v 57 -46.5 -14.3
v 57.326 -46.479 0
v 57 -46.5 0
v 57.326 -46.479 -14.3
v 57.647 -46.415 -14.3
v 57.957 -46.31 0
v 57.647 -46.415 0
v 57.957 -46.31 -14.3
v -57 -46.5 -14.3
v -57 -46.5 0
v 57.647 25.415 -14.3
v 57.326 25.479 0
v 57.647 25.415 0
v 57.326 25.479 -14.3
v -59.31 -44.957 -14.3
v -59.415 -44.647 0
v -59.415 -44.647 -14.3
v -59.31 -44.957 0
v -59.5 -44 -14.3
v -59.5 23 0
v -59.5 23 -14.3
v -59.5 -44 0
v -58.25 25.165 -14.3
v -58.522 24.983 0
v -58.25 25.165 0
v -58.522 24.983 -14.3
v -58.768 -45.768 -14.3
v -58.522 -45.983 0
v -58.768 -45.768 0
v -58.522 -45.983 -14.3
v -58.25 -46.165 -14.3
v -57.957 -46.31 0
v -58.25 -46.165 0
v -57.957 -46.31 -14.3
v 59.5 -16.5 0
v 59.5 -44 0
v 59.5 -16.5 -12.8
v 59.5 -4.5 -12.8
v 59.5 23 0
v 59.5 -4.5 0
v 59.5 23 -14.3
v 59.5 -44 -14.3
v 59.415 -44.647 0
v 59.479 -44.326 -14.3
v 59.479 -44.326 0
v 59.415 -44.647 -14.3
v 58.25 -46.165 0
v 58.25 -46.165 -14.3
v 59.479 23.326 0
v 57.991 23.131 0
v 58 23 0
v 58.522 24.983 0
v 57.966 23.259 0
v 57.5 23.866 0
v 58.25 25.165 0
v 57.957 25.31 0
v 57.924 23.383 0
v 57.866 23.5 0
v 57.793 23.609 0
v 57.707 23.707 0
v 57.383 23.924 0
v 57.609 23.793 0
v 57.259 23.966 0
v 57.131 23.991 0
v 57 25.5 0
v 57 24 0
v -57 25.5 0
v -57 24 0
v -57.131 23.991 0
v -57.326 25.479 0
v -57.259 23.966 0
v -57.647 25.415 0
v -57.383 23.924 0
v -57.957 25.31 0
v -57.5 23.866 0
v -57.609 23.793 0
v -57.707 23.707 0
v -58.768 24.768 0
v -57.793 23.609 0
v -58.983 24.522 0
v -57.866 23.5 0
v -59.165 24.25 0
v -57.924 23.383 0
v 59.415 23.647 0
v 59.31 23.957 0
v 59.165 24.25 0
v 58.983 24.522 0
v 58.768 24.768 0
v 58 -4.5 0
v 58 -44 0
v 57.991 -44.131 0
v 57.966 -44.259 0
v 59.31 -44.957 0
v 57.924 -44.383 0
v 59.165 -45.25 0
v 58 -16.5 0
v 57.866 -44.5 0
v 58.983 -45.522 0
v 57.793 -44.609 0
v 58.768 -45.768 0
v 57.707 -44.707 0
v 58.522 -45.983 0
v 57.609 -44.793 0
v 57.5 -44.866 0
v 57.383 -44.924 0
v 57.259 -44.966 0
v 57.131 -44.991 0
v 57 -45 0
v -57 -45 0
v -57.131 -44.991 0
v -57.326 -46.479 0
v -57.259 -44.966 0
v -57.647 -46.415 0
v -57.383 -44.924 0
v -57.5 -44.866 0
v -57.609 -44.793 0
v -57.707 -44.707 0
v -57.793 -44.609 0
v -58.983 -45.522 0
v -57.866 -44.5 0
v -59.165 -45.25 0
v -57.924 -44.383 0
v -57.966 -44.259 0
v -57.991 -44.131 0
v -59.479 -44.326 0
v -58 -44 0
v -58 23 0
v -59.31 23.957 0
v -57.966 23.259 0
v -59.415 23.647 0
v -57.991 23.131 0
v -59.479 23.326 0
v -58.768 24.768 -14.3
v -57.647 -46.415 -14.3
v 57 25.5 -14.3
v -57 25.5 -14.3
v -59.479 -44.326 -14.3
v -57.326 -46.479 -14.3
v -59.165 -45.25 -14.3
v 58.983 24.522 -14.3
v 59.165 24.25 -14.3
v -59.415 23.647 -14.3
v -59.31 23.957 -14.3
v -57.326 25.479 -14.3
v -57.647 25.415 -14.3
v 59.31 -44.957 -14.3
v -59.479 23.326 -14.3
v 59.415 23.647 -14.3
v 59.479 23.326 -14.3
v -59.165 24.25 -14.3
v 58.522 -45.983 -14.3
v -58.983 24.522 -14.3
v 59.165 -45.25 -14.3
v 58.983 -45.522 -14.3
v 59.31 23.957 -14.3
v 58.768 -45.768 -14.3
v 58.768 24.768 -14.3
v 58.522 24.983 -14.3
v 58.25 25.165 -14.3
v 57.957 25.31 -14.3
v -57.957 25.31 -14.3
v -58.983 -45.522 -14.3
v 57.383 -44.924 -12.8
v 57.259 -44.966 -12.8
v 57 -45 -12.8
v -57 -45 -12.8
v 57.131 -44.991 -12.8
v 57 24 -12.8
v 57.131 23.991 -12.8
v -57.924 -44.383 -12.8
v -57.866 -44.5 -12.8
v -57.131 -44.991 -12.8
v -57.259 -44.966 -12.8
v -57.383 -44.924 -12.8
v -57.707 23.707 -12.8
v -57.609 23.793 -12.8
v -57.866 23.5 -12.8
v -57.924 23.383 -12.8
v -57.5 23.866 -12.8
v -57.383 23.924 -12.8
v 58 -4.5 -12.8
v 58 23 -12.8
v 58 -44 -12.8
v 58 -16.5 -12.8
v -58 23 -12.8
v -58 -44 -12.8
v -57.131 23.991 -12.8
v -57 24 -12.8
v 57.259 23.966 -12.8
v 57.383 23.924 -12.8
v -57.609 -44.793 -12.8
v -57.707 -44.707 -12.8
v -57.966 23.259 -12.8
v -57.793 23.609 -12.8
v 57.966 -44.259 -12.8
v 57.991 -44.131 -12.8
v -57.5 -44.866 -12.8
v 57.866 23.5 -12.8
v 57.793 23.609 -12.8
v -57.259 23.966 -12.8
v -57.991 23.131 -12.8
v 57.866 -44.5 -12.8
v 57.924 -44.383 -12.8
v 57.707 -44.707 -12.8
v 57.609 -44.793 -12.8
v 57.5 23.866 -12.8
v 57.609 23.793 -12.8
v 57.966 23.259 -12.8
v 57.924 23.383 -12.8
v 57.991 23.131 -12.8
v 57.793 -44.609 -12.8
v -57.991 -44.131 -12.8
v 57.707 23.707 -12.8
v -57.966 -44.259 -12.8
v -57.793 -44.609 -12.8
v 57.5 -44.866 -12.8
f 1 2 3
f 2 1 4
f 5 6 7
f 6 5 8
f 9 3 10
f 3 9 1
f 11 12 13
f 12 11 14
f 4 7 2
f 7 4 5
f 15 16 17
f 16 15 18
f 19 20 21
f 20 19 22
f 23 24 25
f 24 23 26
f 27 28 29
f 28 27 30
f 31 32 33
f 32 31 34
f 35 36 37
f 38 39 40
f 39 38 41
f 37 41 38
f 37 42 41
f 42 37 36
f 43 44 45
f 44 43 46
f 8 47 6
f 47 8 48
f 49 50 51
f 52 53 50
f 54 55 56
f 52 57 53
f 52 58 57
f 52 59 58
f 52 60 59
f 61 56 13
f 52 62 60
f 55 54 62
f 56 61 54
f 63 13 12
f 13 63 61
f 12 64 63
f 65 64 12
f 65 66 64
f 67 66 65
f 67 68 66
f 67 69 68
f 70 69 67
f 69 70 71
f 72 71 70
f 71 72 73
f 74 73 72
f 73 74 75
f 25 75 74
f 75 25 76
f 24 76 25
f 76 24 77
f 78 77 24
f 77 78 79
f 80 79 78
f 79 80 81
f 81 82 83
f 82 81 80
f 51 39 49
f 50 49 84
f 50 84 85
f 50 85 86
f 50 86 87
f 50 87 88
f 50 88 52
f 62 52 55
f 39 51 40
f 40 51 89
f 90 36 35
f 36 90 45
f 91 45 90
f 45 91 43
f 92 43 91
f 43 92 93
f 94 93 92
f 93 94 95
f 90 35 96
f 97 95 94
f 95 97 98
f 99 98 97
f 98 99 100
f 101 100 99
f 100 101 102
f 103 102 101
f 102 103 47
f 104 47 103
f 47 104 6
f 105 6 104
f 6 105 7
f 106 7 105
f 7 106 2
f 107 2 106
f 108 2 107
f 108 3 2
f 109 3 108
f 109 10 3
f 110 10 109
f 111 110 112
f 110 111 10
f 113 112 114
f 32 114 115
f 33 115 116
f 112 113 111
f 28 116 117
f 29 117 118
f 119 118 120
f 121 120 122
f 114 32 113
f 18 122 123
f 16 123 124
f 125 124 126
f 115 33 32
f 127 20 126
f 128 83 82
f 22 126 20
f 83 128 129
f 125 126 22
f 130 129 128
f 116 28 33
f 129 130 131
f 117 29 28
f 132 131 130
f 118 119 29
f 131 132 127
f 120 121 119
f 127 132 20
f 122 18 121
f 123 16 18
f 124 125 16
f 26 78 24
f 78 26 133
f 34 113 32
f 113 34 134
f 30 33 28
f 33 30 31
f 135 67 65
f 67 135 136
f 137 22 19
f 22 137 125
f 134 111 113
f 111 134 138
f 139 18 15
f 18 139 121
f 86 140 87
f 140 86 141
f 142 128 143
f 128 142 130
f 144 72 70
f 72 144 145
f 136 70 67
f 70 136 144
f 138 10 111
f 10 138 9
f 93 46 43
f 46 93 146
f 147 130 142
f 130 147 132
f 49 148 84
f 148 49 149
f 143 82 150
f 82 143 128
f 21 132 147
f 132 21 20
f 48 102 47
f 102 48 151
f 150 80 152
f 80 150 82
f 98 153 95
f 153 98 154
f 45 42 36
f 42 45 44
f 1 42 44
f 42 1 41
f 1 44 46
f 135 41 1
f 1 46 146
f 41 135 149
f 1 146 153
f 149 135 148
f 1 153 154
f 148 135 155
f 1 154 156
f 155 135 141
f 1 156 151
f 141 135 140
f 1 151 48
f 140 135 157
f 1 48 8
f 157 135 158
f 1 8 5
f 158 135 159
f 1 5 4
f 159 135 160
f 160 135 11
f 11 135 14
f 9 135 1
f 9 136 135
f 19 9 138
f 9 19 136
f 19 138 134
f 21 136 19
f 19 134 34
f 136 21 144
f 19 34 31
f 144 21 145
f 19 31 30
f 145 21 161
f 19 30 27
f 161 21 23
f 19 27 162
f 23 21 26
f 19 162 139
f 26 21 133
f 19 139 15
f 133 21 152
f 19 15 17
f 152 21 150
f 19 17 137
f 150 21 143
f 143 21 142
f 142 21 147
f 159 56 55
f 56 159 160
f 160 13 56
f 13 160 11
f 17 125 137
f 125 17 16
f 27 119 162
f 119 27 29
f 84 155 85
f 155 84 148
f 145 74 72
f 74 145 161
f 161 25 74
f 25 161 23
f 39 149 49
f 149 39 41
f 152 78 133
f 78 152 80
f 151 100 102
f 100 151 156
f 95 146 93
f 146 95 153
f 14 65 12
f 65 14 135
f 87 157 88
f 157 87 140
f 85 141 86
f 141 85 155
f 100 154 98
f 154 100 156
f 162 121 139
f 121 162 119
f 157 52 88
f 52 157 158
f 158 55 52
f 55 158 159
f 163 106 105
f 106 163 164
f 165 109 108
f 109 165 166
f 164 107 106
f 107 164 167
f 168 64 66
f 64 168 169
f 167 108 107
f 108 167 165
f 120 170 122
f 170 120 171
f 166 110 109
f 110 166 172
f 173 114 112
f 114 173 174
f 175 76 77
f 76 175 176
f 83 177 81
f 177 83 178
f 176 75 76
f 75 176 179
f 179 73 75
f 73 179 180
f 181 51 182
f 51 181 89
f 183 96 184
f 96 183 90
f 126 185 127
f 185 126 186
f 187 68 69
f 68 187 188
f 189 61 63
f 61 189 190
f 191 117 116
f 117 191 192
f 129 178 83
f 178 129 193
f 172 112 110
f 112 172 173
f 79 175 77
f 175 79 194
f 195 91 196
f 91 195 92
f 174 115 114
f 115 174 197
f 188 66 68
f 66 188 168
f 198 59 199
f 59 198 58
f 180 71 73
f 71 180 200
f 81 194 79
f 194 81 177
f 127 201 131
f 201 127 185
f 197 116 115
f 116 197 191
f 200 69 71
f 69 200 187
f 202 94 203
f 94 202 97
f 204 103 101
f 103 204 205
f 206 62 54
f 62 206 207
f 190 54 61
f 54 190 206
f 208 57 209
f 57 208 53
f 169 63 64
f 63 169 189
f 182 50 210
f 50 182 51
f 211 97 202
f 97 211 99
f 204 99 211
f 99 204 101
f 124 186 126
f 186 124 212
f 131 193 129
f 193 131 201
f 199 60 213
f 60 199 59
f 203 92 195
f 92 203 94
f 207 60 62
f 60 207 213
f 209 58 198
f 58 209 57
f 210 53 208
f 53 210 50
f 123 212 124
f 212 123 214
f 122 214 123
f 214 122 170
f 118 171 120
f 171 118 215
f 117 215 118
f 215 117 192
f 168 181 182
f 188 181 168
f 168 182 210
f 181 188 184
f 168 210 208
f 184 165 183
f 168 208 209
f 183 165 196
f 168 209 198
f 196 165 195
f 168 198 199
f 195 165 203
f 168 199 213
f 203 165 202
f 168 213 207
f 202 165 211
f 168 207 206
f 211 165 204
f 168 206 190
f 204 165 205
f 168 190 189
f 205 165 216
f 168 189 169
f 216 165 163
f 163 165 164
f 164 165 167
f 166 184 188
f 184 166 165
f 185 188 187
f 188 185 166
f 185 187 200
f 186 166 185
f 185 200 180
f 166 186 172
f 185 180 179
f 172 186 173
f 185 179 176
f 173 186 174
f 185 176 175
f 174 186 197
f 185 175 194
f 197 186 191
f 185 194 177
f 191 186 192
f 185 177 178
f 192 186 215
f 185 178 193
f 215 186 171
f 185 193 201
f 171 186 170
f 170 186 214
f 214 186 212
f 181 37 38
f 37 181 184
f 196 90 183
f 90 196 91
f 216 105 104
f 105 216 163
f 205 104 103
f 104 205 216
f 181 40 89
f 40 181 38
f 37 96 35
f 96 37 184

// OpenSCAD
// Separate rear-shell insert study. Coordinates are PCB X/Y, in mm.
// Put the open lip at Z=0 locally; assembly Z depends on bottom-side part heights.
profile = "flat"; // [flat,compact]
assert(profile == "flat" || profile == "compact");
pack_max = profile == "flat" ? [114, 67, 10.8] : [69, 56.5, 19];
pocket_center = profile == "flat" ? [0, -10.5] : [0, 0];

// Provisional allowances, subject to measured pack growth and enclosure fit.
side_gap = 1;
depth_gap = 2;
wall = 1.5;
floor_thickness = 1.5;
lead_opening = 12;
lead_y = 0;
$fn = 48;

module rounded_slab(size, r, height) {
    linear_extrude(height=height)
        offset(r=r) square([size[0]-2*r, size[1]-2*r], center=true);
}

module battery_pocket(pack, center) {
    inside = [pack[0]+2*side_gap, pack[1]+2*side_gap];
    outside = [inside[0]+2*wall, inside[1]+2*wall];
    depth = pack[2]+depth_gap;
    translate([center[0], center[1], 0]) difference() {
        translate([0,0,-depth-floor_thickness])
            rounded_slab(outside, 1+wall, depth+floor_thickness);
        translate([0,0,-depth])
            rounded_slab(inside, 1, depth+0.1);
        // An open-top slot allows the harness to drop in without threading its plug.
        translate([inside[0]/2-0.1, lead_y-lead_opening/2, -depth])
            cube([wall+0.2, lead_opening, depth+0.1]);
    }
}

battery_pocket(pack_max, pocket_center);
